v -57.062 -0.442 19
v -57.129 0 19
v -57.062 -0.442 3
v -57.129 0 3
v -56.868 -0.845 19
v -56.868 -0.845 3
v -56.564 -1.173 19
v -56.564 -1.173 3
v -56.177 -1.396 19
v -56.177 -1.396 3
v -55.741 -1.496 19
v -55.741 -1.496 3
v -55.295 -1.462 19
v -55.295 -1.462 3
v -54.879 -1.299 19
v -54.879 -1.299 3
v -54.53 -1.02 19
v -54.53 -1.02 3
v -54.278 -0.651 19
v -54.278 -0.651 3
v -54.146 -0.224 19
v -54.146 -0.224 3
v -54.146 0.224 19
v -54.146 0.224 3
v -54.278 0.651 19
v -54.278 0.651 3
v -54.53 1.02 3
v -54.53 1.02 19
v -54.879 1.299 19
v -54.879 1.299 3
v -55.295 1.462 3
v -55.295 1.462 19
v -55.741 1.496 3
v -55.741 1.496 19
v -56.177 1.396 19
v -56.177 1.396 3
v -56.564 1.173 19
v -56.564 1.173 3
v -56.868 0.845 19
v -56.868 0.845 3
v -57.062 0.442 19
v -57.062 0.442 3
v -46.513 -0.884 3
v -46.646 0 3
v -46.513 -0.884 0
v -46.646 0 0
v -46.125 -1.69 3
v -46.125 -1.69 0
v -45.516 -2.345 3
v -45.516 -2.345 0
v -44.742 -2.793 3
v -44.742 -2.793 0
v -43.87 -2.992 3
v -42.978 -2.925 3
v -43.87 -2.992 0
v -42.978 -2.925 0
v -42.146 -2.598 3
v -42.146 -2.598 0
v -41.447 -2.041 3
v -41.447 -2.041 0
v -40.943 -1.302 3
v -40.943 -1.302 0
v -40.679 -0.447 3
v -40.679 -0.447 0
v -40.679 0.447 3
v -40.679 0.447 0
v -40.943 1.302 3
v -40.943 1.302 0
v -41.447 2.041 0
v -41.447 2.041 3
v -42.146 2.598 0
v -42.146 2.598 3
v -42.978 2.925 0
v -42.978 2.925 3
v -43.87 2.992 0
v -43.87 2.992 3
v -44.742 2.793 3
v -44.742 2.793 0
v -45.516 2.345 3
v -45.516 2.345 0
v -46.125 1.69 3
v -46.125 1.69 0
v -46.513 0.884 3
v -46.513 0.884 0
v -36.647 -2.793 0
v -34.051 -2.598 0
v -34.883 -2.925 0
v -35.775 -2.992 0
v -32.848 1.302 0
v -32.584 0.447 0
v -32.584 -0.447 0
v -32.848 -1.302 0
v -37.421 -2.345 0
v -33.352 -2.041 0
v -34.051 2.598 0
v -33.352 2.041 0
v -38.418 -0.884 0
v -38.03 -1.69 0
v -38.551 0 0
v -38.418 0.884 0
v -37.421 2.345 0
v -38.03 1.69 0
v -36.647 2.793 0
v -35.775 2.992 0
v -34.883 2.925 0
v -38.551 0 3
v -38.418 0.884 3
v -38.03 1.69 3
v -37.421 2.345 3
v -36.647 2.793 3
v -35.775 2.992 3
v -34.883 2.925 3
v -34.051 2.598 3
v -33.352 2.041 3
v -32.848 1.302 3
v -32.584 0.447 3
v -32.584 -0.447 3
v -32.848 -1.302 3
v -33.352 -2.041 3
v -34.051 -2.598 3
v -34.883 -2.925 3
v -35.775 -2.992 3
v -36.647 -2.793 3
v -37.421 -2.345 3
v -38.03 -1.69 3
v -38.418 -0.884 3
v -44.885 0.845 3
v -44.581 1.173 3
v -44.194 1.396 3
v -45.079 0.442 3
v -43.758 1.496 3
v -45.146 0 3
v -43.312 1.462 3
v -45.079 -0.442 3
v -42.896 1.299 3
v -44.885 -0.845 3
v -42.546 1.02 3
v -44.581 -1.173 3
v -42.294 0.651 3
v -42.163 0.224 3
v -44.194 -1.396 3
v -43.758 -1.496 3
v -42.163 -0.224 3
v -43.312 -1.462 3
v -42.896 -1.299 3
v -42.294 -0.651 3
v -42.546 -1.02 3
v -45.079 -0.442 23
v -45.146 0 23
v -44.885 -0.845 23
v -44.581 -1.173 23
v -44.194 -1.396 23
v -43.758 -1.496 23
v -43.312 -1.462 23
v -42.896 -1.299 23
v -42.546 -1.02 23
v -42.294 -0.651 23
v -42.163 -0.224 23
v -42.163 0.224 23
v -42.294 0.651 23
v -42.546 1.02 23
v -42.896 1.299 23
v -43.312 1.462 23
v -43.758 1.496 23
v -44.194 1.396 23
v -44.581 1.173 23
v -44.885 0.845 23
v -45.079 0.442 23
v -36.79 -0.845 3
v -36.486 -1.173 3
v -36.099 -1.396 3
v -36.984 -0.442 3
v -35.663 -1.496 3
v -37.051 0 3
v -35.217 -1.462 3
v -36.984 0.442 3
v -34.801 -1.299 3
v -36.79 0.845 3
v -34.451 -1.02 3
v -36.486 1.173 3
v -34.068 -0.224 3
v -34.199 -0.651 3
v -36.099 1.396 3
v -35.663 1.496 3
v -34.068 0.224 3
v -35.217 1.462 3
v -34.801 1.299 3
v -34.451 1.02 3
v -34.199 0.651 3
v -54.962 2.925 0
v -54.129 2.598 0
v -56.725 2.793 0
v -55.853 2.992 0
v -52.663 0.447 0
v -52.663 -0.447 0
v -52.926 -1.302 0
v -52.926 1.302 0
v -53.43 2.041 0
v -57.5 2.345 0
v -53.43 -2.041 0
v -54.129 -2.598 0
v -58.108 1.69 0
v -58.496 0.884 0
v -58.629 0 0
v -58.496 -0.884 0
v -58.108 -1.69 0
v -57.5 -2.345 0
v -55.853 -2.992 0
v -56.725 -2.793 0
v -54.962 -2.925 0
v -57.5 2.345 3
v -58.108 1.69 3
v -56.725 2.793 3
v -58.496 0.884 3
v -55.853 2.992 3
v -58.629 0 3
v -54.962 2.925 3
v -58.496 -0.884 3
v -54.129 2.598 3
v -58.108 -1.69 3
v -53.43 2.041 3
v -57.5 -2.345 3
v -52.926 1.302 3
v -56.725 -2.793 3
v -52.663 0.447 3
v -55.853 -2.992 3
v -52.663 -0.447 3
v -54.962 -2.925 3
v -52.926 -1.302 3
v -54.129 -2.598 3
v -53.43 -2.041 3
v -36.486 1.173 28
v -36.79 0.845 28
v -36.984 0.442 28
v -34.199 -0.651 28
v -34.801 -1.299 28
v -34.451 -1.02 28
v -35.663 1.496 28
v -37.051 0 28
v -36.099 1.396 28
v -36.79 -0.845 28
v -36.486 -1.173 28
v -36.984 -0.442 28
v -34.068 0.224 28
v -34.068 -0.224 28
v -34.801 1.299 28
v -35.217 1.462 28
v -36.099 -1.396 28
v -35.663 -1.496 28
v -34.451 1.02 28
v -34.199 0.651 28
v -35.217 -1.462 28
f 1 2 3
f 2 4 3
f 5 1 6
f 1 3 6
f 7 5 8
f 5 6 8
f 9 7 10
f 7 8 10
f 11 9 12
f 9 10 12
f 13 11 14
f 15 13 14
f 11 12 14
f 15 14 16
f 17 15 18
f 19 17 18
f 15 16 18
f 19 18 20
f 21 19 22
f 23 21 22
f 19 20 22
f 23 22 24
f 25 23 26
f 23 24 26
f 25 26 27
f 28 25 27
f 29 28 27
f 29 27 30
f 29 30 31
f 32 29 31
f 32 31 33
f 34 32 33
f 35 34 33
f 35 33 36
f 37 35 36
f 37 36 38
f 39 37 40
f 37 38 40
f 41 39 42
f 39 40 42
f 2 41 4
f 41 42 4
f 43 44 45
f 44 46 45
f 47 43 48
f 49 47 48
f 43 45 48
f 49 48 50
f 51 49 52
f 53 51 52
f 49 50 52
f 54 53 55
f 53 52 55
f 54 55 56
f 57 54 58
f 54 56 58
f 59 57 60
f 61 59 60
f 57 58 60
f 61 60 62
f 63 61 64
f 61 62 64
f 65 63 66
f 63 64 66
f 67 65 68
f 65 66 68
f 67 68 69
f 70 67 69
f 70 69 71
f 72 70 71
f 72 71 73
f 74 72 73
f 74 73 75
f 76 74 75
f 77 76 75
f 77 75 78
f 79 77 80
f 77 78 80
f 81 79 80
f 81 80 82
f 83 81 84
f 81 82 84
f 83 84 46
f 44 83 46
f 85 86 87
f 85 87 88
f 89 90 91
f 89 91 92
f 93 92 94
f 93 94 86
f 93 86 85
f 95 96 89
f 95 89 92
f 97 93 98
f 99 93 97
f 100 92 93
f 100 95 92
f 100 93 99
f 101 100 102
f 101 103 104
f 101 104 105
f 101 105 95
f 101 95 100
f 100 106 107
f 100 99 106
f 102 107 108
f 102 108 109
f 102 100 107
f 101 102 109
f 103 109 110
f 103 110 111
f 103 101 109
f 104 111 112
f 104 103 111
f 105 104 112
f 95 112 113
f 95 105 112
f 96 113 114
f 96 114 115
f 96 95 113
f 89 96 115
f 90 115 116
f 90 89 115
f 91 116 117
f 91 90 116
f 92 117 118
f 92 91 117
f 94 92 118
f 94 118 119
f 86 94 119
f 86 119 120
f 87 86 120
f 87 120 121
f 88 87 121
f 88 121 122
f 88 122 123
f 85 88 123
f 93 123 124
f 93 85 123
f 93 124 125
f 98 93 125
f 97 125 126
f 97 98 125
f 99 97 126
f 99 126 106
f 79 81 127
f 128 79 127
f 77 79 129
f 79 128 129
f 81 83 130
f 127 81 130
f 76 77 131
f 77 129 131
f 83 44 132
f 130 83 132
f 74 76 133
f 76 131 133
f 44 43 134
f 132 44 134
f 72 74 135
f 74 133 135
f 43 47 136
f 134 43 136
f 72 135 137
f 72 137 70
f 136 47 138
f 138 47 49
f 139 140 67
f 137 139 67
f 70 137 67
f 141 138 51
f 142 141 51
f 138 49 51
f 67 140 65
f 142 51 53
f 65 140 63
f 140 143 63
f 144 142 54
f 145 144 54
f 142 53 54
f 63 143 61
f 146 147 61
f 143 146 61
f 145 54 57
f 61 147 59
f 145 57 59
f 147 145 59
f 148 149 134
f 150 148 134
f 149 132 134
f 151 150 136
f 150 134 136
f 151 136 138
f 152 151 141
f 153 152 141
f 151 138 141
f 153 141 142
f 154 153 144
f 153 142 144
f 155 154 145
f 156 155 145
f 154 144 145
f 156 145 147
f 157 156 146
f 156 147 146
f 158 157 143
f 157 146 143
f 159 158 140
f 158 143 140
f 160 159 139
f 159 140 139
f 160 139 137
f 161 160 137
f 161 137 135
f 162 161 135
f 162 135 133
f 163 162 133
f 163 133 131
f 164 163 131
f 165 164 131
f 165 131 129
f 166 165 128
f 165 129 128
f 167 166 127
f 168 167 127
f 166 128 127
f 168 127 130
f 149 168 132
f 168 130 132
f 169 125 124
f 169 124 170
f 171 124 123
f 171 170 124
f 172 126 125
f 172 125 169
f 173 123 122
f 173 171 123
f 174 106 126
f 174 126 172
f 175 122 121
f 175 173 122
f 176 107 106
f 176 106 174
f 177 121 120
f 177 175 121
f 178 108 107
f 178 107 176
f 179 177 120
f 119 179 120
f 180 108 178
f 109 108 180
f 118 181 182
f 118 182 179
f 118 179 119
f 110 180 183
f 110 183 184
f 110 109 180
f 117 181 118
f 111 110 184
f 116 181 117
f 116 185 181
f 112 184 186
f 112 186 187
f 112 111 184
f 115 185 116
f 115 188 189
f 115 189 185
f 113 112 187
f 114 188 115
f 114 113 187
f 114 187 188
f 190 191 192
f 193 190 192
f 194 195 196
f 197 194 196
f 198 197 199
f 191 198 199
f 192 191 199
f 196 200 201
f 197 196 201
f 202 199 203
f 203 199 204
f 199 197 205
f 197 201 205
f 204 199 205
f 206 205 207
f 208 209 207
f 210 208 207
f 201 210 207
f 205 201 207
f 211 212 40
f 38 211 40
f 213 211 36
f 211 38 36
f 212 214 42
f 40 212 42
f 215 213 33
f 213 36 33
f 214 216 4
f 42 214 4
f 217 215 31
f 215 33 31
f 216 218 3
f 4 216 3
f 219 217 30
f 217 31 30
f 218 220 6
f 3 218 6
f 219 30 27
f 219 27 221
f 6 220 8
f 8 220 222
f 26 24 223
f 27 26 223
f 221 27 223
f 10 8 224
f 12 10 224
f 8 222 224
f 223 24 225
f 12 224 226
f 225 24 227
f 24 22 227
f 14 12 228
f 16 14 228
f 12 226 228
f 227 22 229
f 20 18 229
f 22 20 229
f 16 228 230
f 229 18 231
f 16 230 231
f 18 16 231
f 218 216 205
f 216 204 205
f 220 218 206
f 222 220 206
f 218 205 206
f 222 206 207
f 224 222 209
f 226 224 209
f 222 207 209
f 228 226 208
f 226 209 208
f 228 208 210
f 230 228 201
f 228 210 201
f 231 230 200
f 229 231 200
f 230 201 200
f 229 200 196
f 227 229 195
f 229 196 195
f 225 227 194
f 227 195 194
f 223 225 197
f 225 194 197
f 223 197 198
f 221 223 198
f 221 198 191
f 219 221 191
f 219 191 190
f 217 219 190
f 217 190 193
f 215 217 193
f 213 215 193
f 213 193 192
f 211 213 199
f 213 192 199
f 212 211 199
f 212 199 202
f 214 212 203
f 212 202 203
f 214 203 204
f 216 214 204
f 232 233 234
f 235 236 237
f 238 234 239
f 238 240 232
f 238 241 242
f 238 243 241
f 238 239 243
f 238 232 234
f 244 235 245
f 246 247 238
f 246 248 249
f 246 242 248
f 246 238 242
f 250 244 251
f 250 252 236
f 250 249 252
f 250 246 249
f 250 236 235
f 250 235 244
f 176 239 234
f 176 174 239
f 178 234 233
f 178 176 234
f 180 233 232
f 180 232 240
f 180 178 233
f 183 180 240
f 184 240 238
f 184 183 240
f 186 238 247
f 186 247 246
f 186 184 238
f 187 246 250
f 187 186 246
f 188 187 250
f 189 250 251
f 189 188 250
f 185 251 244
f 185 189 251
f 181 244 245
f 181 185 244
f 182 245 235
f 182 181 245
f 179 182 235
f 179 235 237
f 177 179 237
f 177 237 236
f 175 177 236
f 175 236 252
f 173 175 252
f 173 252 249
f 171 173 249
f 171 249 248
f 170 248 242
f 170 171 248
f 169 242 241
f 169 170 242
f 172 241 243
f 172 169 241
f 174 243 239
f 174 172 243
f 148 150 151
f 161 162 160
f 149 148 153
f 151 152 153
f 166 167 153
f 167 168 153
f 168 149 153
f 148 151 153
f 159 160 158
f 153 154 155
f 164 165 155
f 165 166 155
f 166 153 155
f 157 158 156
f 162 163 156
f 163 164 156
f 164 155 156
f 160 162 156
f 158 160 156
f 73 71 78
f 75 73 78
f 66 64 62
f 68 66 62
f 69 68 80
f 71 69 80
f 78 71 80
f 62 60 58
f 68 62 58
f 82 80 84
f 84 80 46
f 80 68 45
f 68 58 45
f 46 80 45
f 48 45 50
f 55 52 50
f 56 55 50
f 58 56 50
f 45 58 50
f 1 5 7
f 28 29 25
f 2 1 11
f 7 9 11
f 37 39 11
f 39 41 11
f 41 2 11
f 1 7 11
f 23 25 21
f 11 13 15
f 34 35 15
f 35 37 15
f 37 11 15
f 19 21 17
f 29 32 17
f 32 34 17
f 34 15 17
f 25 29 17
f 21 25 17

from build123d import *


with BuildPart() as f1:
    # F0 (on Front) → F1 (revolve)
    with BuildSketch(Plane.XZ):
        Polygon((-46.645819, 0), (-43.645819, 0), (-43.645819, 23), (-45.145819, 23), (-45.145819, 3), (-46.645819, 3), align=None)
    revolve(axis=Axis((-43.645819, 0, 11.5), (0, 0, 1)))


with BuildPart() as f2:
    # F0 (on Front) → F2 (revolve)
    with BuildSketch(Plane.XZ):
        Polygon((-38.550951, 3), (-38.550951, 0), (-35.550951, 0), (-35.550951, 28), (-37.050951, 28), (-37.050951, 3), align=None)
    revolve(axis=Axis((-35.550951, 0, 14), (0, 0, -1)))


with BuildPart() as f3:
    # F0 (on Front) → F3 (revolve)
    with BuildSketch(Plane.XZ):
        Polygon((-58.629103, 3), (-58.629103, 0), (-55.629103, 0), (-55.629103, 19), (-57.129103, 19), (-57.129103, 3), align=None)
    revolve(axis=Axis((-55.629103, 0, 9.5), (0, 0, 1)))


solid = Compound([f1.part, f2.part, f3.part])
